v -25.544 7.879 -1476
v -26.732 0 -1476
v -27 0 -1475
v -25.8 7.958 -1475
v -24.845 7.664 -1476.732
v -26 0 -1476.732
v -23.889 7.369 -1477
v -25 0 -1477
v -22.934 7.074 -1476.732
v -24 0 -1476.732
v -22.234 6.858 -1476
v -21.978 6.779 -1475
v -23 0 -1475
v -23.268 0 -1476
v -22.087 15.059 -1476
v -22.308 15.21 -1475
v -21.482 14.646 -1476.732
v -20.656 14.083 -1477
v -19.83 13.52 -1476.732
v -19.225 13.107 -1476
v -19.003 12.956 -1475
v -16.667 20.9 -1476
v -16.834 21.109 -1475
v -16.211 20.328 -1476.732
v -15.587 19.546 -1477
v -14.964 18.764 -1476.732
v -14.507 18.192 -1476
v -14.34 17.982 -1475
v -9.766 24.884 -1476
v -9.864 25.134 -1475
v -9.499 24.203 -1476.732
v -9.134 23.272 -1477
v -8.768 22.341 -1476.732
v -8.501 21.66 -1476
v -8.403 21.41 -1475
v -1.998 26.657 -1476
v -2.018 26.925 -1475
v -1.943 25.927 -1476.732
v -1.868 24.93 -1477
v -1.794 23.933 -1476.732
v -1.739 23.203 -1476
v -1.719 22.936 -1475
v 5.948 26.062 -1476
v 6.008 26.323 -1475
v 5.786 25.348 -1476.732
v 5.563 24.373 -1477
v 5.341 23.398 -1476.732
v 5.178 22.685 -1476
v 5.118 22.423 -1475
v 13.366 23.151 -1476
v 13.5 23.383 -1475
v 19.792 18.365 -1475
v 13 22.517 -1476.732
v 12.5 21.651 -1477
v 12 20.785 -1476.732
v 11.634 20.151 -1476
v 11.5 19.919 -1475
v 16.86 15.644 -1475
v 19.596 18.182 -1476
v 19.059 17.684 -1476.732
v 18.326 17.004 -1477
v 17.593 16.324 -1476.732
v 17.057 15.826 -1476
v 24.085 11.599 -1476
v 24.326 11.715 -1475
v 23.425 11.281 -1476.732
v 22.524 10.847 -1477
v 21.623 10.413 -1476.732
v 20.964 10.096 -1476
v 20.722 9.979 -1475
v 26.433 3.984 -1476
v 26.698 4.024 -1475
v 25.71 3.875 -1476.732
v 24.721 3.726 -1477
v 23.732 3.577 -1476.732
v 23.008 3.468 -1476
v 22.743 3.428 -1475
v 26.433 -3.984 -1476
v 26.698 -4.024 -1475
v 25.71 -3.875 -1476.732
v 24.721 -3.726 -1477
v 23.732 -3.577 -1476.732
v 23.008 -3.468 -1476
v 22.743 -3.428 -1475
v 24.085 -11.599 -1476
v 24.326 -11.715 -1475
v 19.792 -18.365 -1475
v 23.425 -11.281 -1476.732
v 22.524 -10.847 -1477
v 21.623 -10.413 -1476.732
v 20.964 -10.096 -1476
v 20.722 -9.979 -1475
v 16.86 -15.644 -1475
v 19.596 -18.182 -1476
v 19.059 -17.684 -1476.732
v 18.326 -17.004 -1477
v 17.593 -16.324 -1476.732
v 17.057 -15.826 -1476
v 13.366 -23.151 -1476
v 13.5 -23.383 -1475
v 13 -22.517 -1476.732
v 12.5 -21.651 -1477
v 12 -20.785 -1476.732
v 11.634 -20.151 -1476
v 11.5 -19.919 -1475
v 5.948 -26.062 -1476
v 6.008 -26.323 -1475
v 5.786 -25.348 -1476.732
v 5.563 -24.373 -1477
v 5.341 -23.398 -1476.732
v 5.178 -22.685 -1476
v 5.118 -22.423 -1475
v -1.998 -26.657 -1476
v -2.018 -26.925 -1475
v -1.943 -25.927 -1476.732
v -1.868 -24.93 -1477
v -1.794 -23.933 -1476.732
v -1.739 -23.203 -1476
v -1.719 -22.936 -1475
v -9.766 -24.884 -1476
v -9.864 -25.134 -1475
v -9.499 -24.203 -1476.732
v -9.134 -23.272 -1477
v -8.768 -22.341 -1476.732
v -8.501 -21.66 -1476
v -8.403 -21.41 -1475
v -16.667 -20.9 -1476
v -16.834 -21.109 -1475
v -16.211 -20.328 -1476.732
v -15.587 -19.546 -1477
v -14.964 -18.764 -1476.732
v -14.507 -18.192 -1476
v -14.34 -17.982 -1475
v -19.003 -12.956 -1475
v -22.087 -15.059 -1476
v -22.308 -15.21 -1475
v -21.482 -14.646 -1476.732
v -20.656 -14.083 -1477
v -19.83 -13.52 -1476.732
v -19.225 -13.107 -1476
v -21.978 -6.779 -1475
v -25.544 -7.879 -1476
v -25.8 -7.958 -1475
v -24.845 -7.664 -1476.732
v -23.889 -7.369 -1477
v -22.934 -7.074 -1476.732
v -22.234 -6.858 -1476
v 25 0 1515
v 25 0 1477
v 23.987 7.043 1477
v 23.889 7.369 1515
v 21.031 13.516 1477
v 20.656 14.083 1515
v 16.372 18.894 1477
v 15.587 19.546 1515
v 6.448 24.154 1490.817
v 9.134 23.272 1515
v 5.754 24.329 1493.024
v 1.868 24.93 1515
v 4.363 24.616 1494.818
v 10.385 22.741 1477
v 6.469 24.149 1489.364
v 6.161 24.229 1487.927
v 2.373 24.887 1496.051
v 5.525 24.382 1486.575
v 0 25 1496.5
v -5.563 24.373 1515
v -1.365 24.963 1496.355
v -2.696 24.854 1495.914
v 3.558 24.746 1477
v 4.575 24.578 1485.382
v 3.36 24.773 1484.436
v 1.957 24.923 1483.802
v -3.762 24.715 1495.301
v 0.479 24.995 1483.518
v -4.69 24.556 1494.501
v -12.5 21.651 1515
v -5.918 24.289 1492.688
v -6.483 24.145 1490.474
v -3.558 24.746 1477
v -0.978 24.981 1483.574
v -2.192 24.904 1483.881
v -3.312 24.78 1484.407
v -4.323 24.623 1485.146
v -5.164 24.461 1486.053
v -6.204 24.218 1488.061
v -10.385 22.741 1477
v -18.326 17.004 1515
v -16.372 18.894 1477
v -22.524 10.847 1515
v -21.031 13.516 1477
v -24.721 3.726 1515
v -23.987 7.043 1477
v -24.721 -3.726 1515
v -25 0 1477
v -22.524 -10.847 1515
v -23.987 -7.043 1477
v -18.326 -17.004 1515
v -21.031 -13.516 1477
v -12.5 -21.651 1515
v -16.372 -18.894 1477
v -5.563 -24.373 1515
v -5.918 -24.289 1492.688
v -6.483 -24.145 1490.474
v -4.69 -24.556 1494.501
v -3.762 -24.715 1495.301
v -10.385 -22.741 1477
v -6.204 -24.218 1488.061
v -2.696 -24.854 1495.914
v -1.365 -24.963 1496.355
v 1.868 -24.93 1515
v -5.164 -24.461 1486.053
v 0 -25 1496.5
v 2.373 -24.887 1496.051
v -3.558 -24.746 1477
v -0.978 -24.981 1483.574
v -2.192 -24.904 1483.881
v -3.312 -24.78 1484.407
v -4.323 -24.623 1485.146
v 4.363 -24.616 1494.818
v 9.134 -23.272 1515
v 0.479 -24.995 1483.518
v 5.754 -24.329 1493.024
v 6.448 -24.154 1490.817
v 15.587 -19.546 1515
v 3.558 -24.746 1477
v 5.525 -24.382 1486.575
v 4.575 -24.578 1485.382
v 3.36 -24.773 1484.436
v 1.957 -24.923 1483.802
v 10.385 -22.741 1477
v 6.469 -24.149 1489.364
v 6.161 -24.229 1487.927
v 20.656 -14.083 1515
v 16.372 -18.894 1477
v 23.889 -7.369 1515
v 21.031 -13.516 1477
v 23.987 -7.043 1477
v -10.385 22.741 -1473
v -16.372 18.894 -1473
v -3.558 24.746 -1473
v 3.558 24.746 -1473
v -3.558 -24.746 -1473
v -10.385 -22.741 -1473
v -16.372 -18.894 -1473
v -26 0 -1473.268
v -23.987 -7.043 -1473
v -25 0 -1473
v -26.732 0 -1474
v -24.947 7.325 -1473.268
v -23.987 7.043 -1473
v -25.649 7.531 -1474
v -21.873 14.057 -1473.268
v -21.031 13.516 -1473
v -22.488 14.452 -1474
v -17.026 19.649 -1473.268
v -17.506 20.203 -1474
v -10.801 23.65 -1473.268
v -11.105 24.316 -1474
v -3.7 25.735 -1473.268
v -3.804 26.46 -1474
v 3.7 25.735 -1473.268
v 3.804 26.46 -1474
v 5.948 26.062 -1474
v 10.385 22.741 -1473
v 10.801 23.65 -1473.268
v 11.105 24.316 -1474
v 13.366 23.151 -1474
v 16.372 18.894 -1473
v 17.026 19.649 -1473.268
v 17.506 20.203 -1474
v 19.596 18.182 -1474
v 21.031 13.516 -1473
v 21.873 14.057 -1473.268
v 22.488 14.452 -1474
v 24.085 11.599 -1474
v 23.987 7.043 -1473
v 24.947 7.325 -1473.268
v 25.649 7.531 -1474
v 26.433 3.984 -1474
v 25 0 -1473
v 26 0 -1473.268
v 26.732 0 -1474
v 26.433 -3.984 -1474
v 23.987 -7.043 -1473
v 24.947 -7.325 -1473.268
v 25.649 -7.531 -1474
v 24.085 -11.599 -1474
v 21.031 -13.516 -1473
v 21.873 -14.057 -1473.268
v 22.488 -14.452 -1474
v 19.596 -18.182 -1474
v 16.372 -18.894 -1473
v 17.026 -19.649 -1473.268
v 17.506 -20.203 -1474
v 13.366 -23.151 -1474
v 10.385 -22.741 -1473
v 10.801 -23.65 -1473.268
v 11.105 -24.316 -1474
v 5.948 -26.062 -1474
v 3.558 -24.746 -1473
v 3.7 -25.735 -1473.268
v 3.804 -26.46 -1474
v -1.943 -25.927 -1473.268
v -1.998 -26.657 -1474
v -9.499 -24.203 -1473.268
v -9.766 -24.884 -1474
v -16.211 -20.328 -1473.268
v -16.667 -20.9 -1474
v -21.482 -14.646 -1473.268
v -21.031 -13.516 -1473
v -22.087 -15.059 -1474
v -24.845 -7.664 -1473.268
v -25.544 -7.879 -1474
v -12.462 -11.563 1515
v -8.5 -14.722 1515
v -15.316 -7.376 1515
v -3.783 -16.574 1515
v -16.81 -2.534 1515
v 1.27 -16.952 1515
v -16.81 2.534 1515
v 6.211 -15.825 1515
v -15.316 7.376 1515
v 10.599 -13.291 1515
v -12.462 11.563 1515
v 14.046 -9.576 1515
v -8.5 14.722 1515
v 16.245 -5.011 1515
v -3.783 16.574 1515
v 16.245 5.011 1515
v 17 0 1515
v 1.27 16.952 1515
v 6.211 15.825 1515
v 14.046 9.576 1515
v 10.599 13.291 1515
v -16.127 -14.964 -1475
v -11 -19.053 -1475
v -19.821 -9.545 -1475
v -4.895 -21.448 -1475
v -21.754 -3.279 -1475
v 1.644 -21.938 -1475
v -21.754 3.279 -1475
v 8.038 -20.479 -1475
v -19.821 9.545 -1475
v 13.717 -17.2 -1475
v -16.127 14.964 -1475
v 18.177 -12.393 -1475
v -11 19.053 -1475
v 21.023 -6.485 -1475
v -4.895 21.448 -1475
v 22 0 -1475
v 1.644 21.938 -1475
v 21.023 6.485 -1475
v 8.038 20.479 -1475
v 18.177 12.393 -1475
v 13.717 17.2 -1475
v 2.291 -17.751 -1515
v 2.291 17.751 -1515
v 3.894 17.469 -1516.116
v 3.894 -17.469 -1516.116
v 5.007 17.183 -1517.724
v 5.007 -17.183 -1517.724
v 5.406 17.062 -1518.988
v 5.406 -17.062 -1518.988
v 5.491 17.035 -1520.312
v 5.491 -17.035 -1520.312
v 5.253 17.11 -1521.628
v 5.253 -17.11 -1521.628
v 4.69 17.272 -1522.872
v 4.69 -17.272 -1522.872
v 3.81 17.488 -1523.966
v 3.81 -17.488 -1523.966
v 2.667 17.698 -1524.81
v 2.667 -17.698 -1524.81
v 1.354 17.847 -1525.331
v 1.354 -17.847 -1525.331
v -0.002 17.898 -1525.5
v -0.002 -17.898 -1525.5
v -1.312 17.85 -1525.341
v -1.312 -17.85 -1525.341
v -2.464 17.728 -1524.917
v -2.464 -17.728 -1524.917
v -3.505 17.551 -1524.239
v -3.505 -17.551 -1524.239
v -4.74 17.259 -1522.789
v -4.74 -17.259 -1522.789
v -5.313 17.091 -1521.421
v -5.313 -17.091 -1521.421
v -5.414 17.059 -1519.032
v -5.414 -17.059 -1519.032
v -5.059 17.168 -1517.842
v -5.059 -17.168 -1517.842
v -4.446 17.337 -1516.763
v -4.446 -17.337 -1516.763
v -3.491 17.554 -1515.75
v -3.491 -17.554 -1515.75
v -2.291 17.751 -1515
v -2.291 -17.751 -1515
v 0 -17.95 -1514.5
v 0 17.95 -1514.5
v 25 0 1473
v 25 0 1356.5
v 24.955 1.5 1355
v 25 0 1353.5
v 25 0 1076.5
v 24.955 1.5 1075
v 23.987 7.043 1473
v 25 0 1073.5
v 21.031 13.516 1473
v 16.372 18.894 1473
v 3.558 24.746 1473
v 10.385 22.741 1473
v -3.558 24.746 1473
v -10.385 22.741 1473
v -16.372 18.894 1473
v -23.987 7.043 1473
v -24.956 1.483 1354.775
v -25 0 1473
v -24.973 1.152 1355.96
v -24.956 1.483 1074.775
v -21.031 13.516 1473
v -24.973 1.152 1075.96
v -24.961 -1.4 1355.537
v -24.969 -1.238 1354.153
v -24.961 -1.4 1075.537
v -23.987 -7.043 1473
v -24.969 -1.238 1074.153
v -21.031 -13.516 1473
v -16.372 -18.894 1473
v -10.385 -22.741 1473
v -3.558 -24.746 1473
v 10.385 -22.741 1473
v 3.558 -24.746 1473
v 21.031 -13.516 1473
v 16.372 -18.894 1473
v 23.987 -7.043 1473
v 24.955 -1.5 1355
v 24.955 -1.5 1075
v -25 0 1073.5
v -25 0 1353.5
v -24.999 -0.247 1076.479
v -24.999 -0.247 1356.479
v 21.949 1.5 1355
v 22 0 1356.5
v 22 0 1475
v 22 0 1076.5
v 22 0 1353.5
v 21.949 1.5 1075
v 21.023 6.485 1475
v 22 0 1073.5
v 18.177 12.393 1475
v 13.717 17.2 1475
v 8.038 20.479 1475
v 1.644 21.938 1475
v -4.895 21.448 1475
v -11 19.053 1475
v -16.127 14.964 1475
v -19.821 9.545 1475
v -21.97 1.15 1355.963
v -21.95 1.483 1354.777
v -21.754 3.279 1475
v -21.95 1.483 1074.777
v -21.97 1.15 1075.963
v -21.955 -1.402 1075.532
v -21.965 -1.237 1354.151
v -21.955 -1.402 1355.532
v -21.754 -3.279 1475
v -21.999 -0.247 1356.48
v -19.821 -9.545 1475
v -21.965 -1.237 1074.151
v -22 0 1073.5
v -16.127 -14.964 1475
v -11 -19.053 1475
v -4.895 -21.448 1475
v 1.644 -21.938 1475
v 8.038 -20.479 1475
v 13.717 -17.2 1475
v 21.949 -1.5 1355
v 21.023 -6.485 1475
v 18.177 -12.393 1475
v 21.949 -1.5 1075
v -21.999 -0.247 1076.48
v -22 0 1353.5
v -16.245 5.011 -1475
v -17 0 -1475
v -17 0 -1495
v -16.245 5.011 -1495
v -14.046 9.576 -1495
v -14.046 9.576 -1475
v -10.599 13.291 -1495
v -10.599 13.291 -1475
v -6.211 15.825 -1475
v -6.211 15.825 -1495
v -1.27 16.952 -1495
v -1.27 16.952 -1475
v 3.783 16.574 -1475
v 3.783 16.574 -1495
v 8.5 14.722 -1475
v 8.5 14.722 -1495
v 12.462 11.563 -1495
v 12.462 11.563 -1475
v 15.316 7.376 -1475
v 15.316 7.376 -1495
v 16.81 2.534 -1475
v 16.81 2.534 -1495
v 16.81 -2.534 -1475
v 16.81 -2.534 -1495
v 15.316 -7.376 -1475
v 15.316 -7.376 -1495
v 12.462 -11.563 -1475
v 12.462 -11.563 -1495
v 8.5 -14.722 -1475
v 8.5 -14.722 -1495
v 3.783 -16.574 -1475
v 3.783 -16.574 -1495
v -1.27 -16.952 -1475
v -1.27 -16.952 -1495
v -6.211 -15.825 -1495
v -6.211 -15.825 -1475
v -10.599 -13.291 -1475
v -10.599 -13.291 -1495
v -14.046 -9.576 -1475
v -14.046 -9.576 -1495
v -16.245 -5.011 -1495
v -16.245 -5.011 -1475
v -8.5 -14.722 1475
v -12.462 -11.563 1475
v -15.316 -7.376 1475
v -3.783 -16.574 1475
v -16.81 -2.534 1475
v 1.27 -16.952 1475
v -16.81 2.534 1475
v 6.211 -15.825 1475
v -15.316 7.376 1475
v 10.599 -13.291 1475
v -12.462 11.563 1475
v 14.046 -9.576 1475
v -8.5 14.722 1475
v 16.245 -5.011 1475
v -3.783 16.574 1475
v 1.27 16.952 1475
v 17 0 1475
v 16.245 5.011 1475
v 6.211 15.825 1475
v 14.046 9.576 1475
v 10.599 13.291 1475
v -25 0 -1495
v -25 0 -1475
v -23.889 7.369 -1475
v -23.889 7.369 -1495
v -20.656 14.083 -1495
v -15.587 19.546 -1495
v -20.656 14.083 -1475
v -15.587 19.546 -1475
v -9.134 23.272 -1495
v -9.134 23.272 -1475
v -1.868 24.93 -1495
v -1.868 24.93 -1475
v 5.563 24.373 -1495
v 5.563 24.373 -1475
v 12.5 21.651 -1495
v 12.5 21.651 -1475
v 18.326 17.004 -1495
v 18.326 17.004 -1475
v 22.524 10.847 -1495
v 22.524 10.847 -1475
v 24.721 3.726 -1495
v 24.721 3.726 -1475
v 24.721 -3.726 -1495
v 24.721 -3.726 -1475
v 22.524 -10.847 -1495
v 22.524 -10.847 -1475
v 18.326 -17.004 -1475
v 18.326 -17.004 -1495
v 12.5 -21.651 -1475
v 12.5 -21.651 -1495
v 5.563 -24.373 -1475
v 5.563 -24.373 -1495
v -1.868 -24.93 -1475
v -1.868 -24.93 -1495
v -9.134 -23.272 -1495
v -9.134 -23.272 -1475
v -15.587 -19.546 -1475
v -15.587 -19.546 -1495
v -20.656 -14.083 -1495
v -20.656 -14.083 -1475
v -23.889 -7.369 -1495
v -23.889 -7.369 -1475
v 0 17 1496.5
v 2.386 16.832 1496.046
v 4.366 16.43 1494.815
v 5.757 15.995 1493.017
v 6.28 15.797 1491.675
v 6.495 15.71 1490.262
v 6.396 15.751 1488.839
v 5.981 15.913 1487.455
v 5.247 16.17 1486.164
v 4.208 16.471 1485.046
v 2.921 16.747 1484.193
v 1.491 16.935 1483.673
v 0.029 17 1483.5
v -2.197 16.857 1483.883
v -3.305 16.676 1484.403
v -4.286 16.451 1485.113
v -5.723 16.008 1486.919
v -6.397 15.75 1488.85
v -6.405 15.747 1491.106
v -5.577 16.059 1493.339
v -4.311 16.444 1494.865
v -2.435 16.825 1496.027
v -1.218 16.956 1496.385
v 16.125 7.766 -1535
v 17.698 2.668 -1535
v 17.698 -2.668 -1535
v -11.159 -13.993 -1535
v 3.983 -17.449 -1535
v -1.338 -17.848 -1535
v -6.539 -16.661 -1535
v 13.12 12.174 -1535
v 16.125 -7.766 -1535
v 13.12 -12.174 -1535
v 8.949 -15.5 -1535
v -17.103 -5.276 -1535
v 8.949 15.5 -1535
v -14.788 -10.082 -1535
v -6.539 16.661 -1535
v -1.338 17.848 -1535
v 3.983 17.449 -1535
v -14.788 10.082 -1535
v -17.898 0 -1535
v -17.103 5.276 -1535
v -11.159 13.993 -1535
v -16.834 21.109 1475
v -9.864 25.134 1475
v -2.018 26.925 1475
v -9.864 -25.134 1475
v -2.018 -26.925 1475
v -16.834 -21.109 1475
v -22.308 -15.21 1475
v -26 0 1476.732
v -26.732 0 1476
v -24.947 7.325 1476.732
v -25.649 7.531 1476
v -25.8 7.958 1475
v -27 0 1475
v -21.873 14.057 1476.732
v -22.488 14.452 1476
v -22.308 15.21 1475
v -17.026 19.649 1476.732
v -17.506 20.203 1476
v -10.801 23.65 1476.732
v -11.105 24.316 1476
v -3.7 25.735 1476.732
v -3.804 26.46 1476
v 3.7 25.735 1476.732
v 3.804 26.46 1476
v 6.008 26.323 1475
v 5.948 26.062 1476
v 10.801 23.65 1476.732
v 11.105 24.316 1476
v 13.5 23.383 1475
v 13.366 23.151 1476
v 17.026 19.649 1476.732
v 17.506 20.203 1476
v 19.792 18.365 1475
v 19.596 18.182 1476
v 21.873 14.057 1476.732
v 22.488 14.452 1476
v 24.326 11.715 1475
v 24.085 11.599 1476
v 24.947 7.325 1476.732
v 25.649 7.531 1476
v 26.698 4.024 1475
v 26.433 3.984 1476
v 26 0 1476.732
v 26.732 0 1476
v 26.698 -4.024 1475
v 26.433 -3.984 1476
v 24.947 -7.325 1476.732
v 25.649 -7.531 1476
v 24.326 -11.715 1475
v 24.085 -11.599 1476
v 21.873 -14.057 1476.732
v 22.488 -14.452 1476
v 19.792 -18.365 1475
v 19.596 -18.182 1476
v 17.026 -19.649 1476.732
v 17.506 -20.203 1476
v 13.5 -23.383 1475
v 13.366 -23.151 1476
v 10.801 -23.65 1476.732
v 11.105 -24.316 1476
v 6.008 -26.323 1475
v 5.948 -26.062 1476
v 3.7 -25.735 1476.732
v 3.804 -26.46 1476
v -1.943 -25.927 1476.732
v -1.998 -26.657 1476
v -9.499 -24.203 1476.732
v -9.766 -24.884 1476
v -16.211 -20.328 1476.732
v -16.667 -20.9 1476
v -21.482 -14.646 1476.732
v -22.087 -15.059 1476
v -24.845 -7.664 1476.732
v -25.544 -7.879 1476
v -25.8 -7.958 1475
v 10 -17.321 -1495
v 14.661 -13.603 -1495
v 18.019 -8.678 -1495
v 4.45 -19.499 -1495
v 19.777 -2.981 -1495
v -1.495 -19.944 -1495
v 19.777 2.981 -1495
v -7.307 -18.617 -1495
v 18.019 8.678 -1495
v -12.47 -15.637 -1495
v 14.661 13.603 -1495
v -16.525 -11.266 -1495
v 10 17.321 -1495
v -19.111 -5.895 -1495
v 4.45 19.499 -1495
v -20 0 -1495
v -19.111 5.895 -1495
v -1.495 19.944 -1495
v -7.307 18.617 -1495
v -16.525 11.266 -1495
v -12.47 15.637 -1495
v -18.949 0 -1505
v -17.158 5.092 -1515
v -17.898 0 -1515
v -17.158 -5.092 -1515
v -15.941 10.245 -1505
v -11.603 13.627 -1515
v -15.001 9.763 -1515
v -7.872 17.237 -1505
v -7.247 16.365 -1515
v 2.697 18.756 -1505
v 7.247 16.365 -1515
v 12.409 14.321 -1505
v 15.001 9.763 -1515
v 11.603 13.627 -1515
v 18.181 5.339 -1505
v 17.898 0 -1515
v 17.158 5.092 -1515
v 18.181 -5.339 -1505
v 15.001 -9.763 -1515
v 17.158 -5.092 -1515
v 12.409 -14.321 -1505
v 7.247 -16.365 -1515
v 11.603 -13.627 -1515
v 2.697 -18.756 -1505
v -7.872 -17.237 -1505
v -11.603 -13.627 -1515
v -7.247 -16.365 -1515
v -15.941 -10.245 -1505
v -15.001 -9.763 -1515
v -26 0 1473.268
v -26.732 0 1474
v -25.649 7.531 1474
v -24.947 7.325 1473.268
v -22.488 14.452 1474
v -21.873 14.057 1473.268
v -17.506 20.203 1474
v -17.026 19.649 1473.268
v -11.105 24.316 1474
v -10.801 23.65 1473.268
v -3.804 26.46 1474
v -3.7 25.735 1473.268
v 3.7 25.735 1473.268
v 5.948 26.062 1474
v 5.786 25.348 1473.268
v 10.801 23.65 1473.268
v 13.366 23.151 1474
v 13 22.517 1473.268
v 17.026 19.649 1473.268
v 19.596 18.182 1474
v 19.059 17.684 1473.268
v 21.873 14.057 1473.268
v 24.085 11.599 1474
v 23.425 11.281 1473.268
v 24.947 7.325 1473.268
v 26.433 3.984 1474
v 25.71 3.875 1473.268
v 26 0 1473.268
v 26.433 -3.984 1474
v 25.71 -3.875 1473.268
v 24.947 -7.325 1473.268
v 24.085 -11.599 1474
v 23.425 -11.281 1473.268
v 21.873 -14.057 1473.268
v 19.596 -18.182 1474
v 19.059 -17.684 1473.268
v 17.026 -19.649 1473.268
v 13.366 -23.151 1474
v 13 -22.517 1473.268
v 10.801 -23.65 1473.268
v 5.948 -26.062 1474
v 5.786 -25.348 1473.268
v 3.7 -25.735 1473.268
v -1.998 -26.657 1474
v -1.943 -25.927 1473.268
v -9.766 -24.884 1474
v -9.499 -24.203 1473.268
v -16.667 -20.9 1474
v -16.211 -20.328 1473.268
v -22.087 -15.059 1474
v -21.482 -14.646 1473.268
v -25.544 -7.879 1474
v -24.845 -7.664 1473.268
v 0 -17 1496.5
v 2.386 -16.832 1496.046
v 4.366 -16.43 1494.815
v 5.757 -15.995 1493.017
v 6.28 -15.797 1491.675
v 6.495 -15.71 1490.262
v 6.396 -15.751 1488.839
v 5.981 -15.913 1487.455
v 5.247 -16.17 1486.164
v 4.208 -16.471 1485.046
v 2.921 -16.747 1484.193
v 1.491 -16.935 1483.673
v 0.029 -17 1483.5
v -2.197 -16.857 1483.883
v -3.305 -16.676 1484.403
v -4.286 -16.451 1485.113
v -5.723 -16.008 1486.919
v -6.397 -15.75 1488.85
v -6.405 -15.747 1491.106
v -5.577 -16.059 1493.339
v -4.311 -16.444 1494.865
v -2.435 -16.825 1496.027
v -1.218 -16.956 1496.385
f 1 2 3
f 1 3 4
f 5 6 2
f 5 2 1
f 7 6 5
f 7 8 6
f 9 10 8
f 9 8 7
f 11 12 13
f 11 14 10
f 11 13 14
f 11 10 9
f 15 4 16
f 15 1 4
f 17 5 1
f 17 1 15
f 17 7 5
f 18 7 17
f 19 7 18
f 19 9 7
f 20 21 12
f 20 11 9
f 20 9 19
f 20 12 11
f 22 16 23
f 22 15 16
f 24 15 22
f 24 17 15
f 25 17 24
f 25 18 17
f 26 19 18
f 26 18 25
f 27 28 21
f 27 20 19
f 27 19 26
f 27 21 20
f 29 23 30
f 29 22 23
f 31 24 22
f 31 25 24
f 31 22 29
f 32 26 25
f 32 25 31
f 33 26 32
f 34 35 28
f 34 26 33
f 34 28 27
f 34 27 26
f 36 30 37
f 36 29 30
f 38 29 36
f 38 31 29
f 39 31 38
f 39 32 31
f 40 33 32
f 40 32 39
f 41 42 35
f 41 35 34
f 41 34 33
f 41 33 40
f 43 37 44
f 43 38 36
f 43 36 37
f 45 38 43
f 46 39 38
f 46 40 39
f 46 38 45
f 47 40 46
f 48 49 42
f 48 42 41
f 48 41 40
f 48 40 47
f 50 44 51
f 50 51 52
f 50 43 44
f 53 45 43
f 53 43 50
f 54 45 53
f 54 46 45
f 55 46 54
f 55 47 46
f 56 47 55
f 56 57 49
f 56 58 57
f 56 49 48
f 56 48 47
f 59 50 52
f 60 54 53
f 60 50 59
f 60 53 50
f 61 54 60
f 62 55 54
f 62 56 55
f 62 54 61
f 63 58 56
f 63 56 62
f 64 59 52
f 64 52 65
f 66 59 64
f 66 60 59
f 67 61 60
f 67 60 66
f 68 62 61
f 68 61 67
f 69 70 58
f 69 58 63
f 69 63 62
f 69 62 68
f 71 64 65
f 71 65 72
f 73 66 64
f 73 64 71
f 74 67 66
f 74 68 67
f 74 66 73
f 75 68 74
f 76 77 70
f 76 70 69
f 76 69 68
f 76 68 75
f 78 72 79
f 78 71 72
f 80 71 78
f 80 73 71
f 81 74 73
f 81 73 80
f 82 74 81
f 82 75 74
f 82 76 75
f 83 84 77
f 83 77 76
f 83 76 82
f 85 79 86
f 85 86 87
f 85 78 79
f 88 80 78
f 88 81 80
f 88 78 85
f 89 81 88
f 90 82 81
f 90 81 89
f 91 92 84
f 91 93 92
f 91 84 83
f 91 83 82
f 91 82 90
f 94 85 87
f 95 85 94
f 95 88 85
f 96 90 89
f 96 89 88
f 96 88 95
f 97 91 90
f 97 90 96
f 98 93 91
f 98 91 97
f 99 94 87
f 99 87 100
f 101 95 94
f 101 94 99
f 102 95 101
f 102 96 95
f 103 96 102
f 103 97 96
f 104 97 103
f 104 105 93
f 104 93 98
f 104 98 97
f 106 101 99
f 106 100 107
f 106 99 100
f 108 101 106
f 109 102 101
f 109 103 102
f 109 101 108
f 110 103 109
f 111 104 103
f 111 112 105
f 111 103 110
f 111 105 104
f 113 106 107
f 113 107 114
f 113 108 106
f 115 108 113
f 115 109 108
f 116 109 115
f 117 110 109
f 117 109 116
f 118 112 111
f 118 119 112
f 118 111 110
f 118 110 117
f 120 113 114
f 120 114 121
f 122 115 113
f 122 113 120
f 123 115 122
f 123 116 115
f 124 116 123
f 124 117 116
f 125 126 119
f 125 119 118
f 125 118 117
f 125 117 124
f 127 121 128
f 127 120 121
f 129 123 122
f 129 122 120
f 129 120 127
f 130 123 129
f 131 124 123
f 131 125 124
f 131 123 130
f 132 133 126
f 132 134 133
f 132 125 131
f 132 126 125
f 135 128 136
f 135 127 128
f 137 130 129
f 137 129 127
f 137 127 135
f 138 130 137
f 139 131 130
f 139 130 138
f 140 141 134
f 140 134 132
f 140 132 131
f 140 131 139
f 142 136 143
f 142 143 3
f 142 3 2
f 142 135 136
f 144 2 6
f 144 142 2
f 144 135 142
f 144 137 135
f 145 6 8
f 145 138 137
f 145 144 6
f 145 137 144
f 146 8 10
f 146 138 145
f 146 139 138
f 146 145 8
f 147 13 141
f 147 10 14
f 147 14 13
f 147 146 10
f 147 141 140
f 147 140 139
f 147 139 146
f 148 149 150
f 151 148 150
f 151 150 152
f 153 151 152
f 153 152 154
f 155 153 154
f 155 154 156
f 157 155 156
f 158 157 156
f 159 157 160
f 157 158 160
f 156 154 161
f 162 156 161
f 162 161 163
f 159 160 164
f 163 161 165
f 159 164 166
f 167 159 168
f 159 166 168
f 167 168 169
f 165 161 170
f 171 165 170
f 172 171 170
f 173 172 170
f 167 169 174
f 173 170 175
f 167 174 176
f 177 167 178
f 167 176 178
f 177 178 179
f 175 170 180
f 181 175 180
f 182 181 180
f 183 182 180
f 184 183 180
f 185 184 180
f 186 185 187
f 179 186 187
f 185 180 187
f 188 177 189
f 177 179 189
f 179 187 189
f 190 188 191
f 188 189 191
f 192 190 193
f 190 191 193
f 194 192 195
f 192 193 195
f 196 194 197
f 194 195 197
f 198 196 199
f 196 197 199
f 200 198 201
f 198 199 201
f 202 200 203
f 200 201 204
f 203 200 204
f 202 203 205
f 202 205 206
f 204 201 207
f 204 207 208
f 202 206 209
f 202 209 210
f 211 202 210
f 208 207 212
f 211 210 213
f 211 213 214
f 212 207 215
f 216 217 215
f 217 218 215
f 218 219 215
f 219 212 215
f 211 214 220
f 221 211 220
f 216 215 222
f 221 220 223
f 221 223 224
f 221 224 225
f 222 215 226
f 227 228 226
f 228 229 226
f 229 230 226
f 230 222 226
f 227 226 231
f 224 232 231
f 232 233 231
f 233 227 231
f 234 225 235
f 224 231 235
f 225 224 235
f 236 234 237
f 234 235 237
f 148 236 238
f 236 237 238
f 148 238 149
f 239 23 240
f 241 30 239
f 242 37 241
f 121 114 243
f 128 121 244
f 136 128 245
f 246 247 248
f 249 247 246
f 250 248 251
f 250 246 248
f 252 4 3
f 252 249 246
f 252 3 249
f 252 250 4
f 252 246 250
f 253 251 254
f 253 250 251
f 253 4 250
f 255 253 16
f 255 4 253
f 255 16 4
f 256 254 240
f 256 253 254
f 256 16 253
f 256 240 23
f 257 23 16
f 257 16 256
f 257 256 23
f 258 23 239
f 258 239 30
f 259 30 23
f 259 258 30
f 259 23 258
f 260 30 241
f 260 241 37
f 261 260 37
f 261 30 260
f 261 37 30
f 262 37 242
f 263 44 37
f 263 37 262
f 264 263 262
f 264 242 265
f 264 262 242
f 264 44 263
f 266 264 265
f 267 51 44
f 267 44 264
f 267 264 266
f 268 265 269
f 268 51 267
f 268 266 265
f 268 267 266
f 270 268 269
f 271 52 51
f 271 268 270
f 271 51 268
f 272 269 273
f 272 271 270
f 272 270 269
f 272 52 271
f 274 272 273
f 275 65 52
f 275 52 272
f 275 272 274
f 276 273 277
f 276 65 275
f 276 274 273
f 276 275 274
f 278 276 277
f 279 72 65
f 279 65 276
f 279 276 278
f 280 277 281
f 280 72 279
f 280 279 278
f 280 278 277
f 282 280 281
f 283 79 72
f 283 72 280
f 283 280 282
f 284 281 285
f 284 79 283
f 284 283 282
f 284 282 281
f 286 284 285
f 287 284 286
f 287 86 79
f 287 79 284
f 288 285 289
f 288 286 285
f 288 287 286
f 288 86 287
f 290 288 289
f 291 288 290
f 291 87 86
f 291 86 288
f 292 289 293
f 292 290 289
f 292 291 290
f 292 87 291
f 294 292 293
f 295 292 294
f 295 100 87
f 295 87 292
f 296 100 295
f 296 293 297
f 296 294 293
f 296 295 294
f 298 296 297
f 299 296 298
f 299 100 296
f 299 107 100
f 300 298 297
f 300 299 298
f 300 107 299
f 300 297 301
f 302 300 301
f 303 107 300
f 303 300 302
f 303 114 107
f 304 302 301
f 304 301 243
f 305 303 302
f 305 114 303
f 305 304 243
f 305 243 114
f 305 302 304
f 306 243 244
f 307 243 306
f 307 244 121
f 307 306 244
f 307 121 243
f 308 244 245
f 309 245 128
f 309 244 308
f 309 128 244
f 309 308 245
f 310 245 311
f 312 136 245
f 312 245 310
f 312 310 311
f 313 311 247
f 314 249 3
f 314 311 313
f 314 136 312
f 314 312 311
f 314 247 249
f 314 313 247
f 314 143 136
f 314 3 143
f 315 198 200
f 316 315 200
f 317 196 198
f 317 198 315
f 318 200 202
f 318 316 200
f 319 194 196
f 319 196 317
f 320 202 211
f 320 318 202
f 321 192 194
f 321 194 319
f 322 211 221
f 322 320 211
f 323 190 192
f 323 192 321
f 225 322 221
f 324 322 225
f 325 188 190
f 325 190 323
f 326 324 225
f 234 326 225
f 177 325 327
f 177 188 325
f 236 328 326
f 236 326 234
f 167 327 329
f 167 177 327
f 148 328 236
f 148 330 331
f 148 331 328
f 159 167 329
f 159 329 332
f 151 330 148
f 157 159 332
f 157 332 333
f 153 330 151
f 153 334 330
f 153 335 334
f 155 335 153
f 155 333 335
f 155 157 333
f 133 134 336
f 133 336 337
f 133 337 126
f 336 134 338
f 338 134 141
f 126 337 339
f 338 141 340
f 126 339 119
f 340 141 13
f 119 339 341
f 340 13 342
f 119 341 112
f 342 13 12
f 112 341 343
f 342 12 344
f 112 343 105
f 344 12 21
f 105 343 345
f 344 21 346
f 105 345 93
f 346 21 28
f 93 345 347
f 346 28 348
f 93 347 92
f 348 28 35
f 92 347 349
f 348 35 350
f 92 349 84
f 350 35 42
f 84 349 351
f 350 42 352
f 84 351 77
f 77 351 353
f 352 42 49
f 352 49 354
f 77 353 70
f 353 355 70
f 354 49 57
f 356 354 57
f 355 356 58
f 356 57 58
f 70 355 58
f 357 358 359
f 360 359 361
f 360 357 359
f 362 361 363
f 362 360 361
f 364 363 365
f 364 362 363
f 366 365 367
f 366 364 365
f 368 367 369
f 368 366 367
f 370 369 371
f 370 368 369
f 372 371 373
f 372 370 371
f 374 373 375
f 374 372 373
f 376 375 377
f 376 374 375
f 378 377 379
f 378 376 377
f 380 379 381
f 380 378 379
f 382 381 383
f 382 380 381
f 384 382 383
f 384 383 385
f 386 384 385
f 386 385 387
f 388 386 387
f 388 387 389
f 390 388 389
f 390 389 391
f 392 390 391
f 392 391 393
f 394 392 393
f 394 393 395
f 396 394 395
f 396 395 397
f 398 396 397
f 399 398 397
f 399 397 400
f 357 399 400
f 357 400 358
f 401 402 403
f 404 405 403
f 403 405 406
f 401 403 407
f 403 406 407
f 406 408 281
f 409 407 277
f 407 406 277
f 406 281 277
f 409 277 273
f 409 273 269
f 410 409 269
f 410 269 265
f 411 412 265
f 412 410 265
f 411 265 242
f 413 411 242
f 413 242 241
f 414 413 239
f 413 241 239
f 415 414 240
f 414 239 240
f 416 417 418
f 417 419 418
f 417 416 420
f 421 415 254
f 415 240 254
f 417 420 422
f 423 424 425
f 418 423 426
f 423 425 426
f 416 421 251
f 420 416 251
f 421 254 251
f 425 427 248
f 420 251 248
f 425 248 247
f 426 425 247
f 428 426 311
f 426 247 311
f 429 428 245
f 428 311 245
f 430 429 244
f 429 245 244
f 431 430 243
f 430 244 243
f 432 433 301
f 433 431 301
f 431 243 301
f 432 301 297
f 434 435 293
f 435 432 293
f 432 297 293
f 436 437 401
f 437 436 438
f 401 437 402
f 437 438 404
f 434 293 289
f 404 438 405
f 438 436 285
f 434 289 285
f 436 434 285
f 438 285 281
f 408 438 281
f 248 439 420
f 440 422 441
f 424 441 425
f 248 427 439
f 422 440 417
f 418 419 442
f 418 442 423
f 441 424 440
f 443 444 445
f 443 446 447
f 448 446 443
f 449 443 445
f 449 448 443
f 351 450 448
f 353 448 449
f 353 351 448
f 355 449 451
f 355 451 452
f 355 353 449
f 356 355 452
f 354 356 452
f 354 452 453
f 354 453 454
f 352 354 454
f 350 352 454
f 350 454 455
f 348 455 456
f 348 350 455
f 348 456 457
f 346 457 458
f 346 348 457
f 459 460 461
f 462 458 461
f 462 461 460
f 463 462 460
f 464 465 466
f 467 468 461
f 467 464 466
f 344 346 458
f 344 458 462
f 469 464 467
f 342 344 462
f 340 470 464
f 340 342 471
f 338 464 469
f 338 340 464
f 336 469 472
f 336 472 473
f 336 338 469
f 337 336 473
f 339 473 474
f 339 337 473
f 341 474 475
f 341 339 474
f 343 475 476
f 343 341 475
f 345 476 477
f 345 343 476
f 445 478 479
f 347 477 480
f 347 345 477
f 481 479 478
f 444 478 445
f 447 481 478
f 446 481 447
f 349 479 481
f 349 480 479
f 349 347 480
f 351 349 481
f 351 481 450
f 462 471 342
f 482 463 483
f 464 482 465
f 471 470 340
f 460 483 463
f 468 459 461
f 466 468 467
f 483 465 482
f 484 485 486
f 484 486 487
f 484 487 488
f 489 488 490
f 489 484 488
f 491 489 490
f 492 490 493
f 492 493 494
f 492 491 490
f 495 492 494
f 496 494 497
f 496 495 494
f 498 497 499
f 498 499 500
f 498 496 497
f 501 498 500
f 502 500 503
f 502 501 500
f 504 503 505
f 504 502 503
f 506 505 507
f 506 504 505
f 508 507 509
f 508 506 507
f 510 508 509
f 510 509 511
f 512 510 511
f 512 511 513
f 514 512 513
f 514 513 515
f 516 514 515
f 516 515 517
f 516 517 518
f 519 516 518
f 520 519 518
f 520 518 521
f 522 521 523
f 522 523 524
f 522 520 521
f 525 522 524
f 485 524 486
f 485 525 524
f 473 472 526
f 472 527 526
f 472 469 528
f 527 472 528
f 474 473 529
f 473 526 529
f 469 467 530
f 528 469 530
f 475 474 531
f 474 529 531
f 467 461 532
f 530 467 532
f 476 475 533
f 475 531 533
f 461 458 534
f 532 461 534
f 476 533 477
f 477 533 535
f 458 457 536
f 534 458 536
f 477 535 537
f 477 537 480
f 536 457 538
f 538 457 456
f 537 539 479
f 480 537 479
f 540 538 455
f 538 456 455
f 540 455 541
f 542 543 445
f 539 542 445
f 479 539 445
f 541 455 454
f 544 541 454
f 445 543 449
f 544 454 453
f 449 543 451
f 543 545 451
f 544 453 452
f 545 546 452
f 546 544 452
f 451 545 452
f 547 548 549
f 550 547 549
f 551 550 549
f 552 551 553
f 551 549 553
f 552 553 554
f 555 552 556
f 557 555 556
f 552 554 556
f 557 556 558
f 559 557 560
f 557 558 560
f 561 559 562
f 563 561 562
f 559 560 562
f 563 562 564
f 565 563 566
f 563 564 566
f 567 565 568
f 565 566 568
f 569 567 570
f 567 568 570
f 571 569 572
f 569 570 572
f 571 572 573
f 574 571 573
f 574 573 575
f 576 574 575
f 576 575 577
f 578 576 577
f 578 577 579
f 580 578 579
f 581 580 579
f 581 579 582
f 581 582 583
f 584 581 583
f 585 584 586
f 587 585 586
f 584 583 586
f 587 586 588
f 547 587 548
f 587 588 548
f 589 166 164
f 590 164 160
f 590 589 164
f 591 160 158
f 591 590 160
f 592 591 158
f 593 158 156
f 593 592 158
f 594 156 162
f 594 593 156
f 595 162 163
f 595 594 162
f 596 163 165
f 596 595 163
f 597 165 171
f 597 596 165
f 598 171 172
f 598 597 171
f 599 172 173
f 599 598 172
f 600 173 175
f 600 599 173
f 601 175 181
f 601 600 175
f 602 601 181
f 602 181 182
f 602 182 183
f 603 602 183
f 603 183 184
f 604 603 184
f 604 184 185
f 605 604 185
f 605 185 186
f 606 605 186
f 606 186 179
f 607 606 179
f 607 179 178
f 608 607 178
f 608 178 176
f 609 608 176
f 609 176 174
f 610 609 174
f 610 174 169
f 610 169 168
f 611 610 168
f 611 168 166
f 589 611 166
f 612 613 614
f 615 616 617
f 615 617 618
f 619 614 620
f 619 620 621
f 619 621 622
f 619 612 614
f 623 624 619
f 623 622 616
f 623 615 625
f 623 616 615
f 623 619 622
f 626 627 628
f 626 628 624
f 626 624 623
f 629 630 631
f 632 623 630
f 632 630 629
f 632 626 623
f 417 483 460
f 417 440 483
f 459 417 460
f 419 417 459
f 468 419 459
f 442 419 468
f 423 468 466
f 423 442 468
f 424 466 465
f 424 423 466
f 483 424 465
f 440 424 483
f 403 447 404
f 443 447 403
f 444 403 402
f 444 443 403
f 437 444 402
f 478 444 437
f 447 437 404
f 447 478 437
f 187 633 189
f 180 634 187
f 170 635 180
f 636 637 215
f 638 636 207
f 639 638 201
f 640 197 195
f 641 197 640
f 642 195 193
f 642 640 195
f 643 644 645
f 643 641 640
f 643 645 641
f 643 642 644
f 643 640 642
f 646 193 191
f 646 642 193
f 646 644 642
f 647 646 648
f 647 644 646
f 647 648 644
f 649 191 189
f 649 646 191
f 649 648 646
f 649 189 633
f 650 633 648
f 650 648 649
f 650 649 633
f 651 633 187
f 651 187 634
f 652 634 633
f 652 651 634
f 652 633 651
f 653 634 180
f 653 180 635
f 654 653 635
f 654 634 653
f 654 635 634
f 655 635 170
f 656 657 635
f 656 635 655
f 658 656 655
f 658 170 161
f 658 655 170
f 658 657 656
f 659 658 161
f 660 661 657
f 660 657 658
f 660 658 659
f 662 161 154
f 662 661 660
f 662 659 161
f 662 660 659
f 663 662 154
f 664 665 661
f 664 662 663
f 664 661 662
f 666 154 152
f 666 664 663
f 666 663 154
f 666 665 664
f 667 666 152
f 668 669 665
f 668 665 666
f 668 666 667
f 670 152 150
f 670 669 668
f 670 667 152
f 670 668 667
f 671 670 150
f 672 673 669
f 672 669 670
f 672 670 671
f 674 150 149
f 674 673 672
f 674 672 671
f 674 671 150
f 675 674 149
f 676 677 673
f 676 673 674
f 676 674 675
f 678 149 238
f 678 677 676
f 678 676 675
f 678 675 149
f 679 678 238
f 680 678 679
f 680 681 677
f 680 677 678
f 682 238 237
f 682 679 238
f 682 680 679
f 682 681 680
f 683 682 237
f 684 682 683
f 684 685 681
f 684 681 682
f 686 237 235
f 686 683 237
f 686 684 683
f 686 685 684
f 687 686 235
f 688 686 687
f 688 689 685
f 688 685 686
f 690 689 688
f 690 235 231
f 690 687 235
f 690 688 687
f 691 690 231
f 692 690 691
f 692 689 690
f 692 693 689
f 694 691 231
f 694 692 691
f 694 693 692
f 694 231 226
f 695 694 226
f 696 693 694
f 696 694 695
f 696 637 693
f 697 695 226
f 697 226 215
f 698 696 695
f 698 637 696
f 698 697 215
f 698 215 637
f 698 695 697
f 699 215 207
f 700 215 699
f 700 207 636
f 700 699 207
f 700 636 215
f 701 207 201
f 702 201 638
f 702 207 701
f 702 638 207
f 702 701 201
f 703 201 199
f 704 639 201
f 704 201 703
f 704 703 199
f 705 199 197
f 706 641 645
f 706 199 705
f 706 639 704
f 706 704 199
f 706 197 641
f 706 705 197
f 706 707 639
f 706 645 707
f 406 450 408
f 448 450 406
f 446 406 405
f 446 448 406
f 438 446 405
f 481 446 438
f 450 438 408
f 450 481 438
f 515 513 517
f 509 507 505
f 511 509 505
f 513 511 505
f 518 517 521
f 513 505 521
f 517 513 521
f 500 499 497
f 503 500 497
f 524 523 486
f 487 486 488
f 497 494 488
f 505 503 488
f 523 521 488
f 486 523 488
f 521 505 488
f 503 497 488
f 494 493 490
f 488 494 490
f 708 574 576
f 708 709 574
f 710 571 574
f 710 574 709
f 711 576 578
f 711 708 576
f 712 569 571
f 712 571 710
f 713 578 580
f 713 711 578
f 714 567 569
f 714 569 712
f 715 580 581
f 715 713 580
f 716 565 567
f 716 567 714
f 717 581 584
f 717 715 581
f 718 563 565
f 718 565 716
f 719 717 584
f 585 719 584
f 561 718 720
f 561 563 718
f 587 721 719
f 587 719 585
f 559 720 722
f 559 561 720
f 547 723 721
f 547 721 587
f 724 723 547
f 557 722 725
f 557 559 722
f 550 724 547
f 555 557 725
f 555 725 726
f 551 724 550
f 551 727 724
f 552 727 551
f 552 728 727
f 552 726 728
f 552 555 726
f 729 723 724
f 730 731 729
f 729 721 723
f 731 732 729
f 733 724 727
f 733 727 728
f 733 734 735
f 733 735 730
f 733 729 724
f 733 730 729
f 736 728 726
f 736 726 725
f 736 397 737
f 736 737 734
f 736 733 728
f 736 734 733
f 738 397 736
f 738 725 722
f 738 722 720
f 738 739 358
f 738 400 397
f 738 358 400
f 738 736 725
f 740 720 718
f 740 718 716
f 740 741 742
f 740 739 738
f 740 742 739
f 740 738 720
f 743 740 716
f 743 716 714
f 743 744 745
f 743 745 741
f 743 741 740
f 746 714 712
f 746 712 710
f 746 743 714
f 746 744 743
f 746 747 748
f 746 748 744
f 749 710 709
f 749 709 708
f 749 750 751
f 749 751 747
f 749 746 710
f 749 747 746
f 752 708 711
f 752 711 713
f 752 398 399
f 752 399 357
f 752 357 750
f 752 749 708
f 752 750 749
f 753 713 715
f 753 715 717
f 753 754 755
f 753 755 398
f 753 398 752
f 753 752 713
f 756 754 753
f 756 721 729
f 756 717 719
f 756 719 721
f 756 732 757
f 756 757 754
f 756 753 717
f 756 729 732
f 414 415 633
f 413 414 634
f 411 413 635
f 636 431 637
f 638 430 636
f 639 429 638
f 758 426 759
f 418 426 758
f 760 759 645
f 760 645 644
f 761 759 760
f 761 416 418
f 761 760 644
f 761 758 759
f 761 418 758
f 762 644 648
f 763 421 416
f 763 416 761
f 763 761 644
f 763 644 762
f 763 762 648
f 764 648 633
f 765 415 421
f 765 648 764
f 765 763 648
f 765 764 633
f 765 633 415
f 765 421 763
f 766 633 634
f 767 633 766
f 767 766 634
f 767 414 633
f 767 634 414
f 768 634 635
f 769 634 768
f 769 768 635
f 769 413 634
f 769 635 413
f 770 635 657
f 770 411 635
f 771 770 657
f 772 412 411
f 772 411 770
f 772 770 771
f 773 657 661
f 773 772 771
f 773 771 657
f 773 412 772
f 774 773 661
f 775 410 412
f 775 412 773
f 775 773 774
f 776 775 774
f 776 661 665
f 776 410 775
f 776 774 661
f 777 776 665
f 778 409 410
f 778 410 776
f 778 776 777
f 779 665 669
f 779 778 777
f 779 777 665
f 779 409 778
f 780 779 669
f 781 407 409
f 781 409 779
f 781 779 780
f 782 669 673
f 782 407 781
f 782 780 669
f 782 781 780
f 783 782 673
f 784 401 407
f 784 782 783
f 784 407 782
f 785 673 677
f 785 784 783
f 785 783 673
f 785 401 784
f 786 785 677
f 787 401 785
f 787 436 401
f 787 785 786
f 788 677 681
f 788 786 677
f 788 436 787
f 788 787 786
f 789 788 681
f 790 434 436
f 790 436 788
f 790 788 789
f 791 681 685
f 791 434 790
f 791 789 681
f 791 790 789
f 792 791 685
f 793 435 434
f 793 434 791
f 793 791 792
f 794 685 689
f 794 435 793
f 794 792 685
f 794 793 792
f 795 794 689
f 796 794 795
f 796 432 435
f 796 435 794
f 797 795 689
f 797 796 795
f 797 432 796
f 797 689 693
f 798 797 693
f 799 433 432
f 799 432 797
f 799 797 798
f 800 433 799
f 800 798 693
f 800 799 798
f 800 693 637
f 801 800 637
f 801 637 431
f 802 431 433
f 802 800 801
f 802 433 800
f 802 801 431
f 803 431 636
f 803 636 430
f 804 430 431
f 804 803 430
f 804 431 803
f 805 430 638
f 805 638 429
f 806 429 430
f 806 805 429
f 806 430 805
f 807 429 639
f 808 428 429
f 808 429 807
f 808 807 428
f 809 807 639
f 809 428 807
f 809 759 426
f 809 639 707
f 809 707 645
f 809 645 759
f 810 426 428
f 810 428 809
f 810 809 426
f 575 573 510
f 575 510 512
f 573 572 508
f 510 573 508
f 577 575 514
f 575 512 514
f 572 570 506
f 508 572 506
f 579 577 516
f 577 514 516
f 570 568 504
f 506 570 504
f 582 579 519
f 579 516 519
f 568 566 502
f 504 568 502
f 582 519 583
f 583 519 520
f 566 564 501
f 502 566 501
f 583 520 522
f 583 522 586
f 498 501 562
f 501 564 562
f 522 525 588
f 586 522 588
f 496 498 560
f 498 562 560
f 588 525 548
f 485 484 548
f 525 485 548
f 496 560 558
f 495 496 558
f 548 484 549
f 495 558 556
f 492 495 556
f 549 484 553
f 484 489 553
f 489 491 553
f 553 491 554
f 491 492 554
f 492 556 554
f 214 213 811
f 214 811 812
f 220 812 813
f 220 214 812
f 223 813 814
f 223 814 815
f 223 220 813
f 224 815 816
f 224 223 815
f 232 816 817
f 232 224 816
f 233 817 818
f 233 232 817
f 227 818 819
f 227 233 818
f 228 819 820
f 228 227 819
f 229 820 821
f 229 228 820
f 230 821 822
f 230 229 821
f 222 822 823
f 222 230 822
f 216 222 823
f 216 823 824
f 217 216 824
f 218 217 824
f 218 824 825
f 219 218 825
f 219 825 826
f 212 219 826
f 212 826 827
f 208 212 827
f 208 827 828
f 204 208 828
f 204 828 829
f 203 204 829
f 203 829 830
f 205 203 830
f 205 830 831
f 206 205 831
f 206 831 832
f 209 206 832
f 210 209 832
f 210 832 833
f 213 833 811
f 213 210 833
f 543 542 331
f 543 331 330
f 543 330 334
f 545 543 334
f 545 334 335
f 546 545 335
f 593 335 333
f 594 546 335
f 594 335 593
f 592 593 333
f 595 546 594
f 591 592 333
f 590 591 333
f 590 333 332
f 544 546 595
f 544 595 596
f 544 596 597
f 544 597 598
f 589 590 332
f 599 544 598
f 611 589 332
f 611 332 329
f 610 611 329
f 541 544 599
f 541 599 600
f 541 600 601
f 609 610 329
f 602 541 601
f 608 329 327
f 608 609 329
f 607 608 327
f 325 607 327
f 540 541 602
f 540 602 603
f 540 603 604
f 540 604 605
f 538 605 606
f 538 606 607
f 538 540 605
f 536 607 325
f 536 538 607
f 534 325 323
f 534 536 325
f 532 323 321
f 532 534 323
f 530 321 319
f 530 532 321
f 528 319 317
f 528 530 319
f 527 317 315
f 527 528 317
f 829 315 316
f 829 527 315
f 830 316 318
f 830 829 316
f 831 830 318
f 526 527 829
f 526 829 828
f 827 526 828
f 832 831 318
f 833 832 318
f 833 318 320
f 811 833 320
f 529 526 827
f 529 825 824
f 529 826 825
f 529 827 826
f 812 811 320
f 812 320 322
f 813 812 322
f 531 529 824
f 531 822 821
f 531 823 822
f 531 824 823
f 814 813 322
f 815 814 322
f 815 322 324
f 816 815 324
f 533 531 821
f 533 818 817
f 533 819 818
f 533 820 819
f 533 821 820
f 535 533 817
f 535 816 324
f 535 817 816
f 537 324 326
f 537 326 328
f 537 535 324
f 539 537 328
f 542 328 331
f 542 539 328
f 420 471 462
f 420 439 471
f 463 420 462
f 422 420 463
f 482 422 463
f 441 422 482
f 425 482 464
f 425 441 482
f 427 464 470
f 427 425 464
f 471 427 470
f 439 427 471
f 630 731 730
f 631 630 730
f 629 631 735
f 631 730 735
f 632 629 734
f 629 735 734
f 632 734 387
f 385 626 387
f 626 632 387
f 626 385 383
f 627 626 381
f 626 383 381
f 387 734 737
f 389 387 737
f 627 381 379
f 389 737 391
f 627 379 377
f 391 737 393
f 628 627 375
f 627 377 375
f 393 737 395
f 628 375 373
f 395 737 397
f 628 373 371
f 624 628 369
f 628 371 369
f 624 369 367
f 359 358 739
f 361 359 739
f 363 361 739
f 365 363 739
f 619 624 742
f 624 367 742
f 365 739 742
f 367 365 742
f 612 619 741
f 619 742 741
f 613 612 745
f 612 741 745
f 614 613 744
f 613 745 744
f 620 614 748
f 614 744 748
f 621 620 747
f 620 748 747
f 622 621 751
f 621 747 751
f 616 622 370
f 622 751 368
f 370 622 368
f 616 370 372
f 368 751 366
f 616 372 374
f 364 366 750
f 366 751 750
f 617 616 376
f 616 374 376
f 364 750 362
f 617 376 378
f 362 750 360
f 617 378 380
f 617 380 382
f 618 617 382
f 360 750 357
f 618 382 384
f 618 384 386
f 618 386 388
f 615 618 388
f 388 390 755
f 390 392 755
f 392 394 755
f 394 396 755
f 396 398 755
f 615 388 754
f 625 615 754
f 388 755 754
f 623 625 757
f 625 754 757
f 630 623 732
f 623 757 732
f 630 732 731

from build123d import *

# Parameters (mm, degrees)
SKETCH1_R               = 25
SKETCH1_R_2             = 22
EXTRUDE_THIN1_DEPTH     = 1475
SKETCH2_R               = 25
SKETCH2_R_2             = 17
EXTRUDE_THIN2_DEPTH     = 40
SKETCH4_R               = 25
SKETCH4_R_2             = 17
EXTRUDE_THIN3_DEPTH     = 20
SKETCH3_R               = 2
SKETCH5_R               = 20
BOSS_EXTRUDE1_DEPTH     = 20
BOSS_EXTRUDE1_TAPER     = 6
SKETCH7_R               = 17.897915295
BOSS_EXTRUDE2_DEPTH     = 20
CUT_EXTRUDE1_DEPTH      = 1536.474845125
CUT_EXTRUDE1_DEPTH_BACK = 1536.474845125
SKETCH6_R               = 6.5
SKETCH6_R_2             = 5.5
CUT_EXTRUDE2_DEPTH      = 1536.474845225
CUT_EXTRUDE2_DEPTH_BACK = 1536.474845225
SKETCH9_R               = 1.5


with BuildPart() as part:
    # Sketch1 → Extrude-Thin1 (new, symmetric)
    with BuildSketch(Plane.XY):
        Circle(SKETCH1_R)
        Circle(SKETCH1_R_2, mode=Mode.SUBTRACT)
    extrude(amount=EXTRUDE_THIN1_DEPTH, both=True)



with BuildPart() as body_2:
    # Sketch2 → Extrude-Thin2 (new body)
    with BuildSketch(Plane.XY.offset(1475)):
        Circle(SKETCH2_R)
        Circle(SKETCH2_R_2, mode=Mode.SUBTRACT)
    extrude(amount=EXTRUDE_THIN2_DEPTH)


with BuildPart() as body_3:
    # Sketch4 → Extrude-Thin3 (new body)
    with BuildSketch(Plane(origin=(0, 0, -1475), x_dir=(-1, 0, 0), z_dir=(0, 0, -1))):
        Circle(SKETCH4_R)
        Circle(SKETCH4_R_2, mode=Mode.SUBTRACT)
    extrude(amount=EXTRUDE_THIN3_DEPTH)

    # Sketch5 → Boss-Extrude1 (add)
    with BuildSketch(Plane(origin=(0, 0, -1495), x_dir=(-1, 0, 0), z_dir=(0, 0, -1))):
        Circle(SKETCH5_R)
    extrude(amount=BOSS_EXTRUDE1_DEPTH, taper=BOSS_EXTRUDE1_TAPER)

    # Sketch7 → Boss-Extrude2 (add)
    with BuildSketch(Plane(origin=(0, 0, -1515), x_dir=(-1, 0, 0), z_dir=(0, 0, -1))):
        Circle(SKETCH7_R)
    extrude(amount=BOSS_EXTRUDE2_DEPTH)


with BuildPart() as part_1:
    add(part.part)

    add(body_2.part)  # Revolve1 merges body 2
    # Sketch3 → Revolve1 (revolve)
    with BuildSketch(Plane(origin=(0, 0, 0), x_dir=(1, 0, 0), z_dir=(0, 1, 0))):
        with Locations((25, -1475)):
            Circle(SKETCH3_R)
        with Locations((25, 1475)):
            Circle(SKETCH3_R)
    revolve(axis=Axis((0, 0, 1515), (0, 0, -1)))


with BuildPart() as cut_extrude1_tool:
    # Sketch6 → Cut-Extrude1 (new, two sides: drawn at the far end of the back side and taken through both)
    with BuildSketch(Plane(origin=(0, 0, 0), x_dir=(1, 0, 0), z_dir=(0, 1, 0)).offset(-CUT_EXTRUDE1_DEPTH_BACK)):
        with Locations((0, -1490)):
            Circle(SKETCH6_R)
        with Locations((0, 1520)):
            Circle(SKETCH6_R_2)
    extrude(amount=CUT_EXTRUDE1_DEPTH + CUT_EXTRUDE1_DEPTH_BACK)


with BuildPart() as part_2:
    add(part_1.part)

    # Cut-Extrude1: cut by cut_extrude1_tool
    add(cut_extrude1_tool.part, mode=Mode.SUBTRACT)

    # Sketch9 → Cut-Extrude2 (cut, two sides: drawn at the far end of the back side and taken through both)
    with BuildSketch(Plane(origin=(0, 0, 0), x_dir=(0, 0, -1), z_dir=(1, 0, 0)).offset(-CUT_EXTRUDE2_DEPTH_BACK)):
        with Locations((-1355, 0)):
            Circle(SKETCH9_R)
        with Locations((-1075, 0)):
            Circle(SKETCH9_R)
    extrude(amount=CUT_EXTRUDE2_DEPTH + CUT_EXTRUDE2_DEPTH_BACK, mode=Mode.SUBTRACT)


with BuildPart() as body_3_1:
    add(body_3.part)

    # Cut-Extrude1: cut by cut_extrude1_tool
    add(cut_extrude1_tool.part, mode=Mode.SUBTRACT)


solid = Compound([part_2.part, body_3_1.part])
